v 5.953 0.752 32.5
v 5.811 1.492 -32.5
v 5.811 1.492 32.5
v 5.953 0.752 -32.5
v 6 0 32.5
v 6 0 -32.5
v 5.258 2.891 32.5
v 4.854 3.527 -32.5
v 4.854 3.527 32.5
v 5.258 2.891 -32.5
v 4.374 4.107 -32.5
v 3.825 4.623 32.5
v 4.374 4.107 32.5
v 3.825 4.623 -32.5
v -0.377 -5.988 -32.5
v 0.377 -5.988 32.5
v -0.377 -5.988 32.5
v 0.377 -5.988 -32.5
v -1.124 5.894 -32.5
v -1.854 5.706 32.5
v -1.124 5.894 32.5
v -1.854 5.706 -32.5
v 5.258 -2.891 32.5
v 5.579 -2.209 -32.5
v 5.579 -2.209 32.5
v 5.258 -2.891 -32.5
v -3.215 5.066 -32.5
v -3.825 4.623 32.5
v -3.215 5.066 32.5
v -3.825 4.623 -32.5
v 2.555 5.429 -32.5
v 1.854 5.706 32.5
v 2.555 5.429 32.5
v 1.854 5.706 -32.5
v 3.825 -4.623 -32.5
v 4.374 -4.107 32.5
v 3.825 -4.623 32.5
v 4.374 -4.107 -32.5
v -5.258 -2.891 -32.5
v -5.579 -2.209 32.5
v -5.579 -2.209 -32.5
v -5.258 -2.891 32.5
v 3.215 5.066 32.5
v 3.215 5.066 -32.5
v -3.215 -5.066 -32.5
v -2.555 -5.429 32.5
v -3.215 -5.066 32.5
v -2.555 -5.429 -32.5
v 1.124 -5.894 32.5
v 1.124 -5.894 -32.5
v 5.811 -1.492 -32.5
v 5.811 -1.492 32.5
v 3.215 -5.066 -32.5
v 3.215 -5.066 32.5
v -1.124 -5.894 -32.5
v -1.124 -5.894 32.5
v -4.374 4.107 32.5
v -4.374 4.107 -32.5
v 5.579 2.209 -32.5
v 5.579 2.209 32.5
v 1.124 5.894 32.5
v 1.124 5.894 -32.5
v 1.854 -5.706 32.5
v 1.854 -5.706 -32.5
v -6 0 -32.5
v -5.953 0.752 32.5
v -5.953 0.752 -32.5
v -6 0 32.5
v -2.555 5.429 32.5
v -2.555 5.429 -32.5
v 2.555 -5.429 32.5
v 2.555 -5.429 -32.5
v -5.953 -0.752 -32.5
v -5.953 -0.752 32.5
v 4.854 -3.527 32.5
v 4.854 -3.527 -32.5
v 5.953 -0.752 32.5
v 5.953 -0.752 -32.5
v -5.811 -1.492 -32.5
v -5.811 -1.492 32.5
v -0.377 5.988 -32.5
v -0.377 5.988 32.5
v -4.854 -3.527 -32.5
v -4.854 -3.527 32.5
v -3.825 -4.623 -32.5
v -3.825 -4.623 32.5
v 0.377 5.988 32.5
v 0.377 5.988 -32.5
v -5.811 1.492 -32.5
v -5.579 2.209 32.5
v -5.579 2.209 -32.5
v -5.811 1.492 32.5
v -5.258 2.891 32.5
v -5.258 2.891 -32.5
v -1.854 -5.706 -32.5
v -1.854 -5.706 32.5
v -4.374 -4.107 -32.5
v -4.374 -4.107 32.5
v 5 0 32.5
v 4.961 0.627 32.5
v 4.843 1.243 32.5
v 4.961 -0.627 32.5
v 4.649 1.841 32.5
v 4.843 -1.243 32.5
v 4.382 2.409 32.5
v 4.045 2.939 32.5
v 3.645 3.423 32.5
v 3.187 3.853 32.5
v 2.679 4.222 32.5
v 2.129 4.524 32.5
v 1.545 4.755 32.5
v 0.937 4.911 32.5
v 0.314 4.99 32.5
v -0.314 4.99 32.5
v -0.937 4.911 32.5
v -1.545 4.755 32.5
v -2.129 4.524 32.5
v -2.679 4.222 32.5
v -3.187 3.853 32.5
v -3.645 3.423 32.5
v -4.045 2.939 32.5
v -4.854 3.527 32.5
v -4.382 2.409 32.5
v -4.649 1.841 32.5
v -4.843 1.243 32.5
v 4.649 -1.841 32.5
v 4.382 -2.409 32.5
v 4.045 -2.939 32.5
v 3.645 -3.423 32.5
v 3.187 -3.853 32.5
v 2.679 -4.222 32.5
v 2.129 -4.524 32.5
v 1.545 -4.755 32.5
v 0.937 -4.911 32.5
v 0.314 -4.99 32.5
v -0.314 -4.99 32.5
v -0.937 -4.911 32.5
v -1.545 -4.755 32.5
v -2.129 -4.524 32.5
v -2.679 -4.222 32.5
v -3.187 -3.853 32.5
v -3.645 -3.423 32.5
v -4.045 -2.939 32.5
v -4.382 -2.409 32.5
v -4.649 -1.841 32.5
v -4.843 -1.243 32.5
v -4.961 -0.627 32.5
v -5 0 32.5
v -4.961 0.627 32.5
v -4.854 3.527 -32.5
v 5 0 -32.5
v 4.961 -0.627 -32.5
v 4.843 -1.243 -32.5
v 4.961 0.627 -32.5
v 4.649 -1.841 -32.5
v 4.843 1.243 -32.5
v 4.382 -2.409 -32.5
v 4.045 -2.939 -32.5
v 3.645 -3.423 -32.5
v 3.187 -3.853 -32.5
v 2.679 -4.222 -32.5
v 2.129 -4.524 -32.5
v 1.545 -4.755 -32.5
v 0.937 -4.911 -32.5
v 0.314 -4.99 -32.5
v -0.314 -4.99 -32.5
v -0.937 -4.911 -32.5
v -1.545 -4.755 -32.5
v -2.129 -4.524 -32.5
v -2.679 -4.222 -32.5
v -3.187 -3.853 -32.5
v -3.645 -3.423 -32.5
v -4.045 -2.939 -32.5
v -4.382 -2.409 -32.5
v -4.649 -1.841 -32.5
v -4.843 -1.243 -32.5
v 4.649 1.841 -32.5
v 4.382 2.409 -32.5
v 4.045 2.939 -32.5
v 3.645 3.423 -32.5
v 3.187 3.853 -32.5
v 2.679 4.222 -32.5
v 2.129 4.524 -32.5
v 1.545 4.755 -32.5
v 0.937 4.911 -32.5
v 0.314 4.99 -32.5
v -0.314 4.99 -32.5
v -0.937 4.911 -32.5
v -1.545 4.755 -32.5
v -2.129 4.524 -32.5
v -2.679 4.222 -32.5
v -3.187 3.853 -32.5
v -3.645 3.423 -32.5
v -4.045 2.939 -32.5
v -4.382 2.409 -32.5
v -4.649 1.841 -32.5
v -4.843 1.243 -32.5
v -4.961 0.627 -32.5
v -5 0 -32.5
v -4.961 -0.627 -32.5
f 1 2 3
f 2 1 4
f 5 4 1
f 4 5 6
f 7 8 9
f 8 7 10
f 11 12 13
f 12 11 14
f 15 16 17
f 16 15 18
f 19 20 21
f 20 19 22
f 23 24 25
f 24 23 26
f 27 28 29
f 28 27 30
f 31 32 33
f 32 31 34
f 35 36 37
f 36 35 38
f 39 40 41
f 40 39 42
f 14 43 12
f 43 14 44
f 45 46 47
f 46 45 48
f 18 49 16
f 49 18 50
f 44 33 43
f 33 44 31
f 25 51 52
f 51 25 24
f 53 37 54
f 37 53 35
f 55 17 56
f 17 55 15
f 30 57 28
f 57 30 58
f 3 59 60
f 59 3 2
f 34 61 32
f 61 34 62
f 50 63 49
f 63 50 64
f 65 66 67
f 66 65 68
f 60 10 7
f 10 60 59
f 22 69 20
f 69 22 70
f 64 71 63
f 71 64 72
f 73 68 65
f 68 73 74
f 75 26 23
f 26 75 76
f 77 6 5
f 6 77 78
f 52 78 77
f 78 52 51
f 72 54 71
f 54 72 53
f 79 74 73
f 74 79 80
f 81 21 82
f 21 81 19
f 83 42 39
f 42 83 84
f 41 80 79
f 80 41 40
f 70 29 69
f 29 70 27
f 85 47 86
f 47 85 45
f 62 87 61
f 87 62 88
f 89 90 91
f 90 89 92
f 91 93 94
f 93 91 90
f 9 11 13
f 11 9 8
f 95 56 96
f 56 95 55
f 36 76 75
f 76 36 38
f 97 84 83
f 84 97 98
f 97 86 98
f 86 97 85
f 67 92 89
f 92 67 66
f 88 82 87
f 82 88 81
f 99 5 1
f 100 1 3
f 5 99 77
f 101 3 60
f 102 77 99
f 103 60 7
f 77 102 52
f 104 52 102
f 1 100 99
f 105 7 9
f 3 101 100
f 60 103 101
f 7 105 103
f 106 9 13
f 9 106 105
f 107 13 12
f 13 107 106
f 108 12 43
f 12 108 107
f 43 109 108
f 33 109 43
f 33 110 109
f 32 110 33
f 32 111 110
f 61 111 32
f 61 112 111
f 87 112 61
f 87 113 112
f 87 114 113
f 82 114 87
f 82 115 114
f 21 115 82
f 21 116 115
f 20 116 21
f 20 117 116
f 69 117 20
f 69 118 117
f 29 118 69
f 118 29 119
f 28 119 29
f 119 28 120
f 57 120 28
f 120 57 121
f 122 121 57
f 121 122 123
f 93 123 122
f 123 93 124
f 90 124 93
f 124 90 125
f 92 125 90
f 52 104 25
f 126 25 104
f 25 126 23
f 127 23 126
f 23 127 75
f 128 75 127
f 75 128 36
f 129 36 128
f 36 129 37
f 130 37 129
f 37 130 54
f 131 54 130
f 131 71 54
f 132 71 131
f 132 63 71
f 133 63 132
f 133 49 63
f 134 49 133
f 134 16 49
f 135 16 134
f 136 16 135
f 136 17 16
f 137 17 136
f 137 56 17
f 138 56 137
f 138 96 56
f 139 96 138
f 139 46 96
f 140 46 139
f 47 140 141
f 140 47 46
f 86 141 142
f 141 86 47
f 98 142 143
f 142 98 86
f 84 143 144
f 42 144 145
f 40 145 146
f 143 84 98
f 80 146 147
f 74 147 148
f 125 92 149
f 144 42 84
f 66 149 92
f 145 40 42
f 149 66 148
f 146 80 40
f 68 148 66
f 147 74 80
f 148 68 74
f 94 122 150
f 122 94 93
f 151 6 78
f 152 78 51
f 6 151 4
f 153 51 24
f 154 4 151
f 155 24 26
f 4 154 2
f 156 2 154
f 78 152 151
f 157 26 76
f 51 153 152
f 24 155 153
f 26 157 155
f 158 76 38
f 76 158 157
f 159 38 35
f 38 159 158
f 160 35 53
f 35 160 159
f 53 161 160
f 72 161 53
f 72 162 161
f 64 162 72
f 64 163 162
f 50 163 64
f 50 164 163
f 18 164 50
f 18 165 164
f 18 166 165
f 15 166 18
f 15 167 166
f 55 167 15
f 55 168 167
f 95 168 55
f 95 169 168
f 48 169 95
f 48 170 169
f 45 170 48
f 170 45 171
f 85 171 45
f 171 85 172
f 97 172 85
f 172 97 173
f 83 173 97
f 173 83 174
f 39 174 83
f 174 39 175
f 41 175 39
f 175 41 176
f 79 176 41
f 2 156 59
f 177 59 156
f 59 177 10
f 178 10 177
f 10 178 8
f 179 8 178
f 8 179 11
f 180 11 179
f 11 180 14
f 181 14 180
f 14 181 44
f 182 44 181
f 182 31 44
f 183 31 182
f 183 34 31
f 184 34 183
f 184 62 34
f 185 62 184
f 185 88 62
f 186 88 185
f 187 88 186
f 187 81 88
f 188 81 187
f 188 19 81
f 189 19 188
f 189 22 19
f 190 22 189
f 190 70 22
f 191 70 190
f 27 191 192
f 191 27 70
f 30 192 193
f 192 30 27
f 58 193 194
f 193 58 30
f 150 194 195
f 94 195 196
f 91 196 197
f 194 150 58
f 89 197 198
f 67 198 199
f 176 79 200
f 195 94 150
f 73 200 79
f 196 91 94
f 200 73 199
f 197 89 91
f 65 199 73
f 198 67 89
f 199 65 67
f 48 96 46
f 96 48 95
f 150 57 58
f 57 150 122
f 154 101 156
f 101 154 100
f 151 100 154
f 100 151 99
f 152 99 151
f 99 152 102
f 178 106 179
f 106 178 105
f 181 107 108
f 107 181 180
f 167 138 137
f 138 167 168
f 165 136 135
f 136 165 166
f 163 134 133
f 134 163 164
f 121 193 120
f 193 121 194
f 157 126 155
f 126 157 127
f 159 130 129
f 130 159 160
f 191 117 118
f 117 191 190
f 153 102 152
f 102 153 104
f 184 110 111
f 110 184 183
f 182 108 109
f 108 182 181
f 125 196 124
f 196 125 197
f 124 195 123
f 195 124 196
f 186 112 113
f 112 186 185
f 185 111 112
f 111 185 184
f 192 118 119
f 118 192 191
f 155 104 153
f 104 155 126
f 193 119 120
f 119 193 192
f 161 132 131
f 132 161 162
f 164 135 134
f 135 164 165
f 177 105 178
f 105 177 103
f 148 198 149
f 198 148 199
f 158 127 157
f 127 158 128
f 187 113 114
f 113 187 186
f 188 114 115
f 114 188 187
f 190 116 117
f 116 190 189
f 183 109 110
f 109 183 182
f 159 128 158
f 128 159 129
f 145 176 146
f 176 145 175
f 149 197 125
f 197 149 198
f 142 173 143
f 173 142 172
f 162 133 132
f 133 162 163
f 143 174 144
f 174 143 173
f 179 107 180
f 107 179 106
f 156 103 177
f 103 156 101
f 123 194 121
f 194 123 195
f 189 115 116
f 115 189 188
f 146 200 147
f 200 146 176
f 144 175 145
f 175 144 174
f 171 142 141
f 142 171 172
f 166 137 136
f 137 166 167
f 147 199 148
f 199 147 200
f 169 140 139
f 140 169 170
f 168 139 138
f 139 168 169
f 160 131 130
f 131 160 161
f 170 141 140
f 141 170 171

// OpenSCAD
$fn = 50;


difference() {
	union() {
		translate(v = [0, 0, -32.5000000000]) {
			cylinder(h = 65, r = 6.0000000000);
		}
	}
	union() {
		translate(v = [0, 0, -100.0000000000]) {
			cylinder(h = 200, r = 5.0000000000);
		}
	}
}
